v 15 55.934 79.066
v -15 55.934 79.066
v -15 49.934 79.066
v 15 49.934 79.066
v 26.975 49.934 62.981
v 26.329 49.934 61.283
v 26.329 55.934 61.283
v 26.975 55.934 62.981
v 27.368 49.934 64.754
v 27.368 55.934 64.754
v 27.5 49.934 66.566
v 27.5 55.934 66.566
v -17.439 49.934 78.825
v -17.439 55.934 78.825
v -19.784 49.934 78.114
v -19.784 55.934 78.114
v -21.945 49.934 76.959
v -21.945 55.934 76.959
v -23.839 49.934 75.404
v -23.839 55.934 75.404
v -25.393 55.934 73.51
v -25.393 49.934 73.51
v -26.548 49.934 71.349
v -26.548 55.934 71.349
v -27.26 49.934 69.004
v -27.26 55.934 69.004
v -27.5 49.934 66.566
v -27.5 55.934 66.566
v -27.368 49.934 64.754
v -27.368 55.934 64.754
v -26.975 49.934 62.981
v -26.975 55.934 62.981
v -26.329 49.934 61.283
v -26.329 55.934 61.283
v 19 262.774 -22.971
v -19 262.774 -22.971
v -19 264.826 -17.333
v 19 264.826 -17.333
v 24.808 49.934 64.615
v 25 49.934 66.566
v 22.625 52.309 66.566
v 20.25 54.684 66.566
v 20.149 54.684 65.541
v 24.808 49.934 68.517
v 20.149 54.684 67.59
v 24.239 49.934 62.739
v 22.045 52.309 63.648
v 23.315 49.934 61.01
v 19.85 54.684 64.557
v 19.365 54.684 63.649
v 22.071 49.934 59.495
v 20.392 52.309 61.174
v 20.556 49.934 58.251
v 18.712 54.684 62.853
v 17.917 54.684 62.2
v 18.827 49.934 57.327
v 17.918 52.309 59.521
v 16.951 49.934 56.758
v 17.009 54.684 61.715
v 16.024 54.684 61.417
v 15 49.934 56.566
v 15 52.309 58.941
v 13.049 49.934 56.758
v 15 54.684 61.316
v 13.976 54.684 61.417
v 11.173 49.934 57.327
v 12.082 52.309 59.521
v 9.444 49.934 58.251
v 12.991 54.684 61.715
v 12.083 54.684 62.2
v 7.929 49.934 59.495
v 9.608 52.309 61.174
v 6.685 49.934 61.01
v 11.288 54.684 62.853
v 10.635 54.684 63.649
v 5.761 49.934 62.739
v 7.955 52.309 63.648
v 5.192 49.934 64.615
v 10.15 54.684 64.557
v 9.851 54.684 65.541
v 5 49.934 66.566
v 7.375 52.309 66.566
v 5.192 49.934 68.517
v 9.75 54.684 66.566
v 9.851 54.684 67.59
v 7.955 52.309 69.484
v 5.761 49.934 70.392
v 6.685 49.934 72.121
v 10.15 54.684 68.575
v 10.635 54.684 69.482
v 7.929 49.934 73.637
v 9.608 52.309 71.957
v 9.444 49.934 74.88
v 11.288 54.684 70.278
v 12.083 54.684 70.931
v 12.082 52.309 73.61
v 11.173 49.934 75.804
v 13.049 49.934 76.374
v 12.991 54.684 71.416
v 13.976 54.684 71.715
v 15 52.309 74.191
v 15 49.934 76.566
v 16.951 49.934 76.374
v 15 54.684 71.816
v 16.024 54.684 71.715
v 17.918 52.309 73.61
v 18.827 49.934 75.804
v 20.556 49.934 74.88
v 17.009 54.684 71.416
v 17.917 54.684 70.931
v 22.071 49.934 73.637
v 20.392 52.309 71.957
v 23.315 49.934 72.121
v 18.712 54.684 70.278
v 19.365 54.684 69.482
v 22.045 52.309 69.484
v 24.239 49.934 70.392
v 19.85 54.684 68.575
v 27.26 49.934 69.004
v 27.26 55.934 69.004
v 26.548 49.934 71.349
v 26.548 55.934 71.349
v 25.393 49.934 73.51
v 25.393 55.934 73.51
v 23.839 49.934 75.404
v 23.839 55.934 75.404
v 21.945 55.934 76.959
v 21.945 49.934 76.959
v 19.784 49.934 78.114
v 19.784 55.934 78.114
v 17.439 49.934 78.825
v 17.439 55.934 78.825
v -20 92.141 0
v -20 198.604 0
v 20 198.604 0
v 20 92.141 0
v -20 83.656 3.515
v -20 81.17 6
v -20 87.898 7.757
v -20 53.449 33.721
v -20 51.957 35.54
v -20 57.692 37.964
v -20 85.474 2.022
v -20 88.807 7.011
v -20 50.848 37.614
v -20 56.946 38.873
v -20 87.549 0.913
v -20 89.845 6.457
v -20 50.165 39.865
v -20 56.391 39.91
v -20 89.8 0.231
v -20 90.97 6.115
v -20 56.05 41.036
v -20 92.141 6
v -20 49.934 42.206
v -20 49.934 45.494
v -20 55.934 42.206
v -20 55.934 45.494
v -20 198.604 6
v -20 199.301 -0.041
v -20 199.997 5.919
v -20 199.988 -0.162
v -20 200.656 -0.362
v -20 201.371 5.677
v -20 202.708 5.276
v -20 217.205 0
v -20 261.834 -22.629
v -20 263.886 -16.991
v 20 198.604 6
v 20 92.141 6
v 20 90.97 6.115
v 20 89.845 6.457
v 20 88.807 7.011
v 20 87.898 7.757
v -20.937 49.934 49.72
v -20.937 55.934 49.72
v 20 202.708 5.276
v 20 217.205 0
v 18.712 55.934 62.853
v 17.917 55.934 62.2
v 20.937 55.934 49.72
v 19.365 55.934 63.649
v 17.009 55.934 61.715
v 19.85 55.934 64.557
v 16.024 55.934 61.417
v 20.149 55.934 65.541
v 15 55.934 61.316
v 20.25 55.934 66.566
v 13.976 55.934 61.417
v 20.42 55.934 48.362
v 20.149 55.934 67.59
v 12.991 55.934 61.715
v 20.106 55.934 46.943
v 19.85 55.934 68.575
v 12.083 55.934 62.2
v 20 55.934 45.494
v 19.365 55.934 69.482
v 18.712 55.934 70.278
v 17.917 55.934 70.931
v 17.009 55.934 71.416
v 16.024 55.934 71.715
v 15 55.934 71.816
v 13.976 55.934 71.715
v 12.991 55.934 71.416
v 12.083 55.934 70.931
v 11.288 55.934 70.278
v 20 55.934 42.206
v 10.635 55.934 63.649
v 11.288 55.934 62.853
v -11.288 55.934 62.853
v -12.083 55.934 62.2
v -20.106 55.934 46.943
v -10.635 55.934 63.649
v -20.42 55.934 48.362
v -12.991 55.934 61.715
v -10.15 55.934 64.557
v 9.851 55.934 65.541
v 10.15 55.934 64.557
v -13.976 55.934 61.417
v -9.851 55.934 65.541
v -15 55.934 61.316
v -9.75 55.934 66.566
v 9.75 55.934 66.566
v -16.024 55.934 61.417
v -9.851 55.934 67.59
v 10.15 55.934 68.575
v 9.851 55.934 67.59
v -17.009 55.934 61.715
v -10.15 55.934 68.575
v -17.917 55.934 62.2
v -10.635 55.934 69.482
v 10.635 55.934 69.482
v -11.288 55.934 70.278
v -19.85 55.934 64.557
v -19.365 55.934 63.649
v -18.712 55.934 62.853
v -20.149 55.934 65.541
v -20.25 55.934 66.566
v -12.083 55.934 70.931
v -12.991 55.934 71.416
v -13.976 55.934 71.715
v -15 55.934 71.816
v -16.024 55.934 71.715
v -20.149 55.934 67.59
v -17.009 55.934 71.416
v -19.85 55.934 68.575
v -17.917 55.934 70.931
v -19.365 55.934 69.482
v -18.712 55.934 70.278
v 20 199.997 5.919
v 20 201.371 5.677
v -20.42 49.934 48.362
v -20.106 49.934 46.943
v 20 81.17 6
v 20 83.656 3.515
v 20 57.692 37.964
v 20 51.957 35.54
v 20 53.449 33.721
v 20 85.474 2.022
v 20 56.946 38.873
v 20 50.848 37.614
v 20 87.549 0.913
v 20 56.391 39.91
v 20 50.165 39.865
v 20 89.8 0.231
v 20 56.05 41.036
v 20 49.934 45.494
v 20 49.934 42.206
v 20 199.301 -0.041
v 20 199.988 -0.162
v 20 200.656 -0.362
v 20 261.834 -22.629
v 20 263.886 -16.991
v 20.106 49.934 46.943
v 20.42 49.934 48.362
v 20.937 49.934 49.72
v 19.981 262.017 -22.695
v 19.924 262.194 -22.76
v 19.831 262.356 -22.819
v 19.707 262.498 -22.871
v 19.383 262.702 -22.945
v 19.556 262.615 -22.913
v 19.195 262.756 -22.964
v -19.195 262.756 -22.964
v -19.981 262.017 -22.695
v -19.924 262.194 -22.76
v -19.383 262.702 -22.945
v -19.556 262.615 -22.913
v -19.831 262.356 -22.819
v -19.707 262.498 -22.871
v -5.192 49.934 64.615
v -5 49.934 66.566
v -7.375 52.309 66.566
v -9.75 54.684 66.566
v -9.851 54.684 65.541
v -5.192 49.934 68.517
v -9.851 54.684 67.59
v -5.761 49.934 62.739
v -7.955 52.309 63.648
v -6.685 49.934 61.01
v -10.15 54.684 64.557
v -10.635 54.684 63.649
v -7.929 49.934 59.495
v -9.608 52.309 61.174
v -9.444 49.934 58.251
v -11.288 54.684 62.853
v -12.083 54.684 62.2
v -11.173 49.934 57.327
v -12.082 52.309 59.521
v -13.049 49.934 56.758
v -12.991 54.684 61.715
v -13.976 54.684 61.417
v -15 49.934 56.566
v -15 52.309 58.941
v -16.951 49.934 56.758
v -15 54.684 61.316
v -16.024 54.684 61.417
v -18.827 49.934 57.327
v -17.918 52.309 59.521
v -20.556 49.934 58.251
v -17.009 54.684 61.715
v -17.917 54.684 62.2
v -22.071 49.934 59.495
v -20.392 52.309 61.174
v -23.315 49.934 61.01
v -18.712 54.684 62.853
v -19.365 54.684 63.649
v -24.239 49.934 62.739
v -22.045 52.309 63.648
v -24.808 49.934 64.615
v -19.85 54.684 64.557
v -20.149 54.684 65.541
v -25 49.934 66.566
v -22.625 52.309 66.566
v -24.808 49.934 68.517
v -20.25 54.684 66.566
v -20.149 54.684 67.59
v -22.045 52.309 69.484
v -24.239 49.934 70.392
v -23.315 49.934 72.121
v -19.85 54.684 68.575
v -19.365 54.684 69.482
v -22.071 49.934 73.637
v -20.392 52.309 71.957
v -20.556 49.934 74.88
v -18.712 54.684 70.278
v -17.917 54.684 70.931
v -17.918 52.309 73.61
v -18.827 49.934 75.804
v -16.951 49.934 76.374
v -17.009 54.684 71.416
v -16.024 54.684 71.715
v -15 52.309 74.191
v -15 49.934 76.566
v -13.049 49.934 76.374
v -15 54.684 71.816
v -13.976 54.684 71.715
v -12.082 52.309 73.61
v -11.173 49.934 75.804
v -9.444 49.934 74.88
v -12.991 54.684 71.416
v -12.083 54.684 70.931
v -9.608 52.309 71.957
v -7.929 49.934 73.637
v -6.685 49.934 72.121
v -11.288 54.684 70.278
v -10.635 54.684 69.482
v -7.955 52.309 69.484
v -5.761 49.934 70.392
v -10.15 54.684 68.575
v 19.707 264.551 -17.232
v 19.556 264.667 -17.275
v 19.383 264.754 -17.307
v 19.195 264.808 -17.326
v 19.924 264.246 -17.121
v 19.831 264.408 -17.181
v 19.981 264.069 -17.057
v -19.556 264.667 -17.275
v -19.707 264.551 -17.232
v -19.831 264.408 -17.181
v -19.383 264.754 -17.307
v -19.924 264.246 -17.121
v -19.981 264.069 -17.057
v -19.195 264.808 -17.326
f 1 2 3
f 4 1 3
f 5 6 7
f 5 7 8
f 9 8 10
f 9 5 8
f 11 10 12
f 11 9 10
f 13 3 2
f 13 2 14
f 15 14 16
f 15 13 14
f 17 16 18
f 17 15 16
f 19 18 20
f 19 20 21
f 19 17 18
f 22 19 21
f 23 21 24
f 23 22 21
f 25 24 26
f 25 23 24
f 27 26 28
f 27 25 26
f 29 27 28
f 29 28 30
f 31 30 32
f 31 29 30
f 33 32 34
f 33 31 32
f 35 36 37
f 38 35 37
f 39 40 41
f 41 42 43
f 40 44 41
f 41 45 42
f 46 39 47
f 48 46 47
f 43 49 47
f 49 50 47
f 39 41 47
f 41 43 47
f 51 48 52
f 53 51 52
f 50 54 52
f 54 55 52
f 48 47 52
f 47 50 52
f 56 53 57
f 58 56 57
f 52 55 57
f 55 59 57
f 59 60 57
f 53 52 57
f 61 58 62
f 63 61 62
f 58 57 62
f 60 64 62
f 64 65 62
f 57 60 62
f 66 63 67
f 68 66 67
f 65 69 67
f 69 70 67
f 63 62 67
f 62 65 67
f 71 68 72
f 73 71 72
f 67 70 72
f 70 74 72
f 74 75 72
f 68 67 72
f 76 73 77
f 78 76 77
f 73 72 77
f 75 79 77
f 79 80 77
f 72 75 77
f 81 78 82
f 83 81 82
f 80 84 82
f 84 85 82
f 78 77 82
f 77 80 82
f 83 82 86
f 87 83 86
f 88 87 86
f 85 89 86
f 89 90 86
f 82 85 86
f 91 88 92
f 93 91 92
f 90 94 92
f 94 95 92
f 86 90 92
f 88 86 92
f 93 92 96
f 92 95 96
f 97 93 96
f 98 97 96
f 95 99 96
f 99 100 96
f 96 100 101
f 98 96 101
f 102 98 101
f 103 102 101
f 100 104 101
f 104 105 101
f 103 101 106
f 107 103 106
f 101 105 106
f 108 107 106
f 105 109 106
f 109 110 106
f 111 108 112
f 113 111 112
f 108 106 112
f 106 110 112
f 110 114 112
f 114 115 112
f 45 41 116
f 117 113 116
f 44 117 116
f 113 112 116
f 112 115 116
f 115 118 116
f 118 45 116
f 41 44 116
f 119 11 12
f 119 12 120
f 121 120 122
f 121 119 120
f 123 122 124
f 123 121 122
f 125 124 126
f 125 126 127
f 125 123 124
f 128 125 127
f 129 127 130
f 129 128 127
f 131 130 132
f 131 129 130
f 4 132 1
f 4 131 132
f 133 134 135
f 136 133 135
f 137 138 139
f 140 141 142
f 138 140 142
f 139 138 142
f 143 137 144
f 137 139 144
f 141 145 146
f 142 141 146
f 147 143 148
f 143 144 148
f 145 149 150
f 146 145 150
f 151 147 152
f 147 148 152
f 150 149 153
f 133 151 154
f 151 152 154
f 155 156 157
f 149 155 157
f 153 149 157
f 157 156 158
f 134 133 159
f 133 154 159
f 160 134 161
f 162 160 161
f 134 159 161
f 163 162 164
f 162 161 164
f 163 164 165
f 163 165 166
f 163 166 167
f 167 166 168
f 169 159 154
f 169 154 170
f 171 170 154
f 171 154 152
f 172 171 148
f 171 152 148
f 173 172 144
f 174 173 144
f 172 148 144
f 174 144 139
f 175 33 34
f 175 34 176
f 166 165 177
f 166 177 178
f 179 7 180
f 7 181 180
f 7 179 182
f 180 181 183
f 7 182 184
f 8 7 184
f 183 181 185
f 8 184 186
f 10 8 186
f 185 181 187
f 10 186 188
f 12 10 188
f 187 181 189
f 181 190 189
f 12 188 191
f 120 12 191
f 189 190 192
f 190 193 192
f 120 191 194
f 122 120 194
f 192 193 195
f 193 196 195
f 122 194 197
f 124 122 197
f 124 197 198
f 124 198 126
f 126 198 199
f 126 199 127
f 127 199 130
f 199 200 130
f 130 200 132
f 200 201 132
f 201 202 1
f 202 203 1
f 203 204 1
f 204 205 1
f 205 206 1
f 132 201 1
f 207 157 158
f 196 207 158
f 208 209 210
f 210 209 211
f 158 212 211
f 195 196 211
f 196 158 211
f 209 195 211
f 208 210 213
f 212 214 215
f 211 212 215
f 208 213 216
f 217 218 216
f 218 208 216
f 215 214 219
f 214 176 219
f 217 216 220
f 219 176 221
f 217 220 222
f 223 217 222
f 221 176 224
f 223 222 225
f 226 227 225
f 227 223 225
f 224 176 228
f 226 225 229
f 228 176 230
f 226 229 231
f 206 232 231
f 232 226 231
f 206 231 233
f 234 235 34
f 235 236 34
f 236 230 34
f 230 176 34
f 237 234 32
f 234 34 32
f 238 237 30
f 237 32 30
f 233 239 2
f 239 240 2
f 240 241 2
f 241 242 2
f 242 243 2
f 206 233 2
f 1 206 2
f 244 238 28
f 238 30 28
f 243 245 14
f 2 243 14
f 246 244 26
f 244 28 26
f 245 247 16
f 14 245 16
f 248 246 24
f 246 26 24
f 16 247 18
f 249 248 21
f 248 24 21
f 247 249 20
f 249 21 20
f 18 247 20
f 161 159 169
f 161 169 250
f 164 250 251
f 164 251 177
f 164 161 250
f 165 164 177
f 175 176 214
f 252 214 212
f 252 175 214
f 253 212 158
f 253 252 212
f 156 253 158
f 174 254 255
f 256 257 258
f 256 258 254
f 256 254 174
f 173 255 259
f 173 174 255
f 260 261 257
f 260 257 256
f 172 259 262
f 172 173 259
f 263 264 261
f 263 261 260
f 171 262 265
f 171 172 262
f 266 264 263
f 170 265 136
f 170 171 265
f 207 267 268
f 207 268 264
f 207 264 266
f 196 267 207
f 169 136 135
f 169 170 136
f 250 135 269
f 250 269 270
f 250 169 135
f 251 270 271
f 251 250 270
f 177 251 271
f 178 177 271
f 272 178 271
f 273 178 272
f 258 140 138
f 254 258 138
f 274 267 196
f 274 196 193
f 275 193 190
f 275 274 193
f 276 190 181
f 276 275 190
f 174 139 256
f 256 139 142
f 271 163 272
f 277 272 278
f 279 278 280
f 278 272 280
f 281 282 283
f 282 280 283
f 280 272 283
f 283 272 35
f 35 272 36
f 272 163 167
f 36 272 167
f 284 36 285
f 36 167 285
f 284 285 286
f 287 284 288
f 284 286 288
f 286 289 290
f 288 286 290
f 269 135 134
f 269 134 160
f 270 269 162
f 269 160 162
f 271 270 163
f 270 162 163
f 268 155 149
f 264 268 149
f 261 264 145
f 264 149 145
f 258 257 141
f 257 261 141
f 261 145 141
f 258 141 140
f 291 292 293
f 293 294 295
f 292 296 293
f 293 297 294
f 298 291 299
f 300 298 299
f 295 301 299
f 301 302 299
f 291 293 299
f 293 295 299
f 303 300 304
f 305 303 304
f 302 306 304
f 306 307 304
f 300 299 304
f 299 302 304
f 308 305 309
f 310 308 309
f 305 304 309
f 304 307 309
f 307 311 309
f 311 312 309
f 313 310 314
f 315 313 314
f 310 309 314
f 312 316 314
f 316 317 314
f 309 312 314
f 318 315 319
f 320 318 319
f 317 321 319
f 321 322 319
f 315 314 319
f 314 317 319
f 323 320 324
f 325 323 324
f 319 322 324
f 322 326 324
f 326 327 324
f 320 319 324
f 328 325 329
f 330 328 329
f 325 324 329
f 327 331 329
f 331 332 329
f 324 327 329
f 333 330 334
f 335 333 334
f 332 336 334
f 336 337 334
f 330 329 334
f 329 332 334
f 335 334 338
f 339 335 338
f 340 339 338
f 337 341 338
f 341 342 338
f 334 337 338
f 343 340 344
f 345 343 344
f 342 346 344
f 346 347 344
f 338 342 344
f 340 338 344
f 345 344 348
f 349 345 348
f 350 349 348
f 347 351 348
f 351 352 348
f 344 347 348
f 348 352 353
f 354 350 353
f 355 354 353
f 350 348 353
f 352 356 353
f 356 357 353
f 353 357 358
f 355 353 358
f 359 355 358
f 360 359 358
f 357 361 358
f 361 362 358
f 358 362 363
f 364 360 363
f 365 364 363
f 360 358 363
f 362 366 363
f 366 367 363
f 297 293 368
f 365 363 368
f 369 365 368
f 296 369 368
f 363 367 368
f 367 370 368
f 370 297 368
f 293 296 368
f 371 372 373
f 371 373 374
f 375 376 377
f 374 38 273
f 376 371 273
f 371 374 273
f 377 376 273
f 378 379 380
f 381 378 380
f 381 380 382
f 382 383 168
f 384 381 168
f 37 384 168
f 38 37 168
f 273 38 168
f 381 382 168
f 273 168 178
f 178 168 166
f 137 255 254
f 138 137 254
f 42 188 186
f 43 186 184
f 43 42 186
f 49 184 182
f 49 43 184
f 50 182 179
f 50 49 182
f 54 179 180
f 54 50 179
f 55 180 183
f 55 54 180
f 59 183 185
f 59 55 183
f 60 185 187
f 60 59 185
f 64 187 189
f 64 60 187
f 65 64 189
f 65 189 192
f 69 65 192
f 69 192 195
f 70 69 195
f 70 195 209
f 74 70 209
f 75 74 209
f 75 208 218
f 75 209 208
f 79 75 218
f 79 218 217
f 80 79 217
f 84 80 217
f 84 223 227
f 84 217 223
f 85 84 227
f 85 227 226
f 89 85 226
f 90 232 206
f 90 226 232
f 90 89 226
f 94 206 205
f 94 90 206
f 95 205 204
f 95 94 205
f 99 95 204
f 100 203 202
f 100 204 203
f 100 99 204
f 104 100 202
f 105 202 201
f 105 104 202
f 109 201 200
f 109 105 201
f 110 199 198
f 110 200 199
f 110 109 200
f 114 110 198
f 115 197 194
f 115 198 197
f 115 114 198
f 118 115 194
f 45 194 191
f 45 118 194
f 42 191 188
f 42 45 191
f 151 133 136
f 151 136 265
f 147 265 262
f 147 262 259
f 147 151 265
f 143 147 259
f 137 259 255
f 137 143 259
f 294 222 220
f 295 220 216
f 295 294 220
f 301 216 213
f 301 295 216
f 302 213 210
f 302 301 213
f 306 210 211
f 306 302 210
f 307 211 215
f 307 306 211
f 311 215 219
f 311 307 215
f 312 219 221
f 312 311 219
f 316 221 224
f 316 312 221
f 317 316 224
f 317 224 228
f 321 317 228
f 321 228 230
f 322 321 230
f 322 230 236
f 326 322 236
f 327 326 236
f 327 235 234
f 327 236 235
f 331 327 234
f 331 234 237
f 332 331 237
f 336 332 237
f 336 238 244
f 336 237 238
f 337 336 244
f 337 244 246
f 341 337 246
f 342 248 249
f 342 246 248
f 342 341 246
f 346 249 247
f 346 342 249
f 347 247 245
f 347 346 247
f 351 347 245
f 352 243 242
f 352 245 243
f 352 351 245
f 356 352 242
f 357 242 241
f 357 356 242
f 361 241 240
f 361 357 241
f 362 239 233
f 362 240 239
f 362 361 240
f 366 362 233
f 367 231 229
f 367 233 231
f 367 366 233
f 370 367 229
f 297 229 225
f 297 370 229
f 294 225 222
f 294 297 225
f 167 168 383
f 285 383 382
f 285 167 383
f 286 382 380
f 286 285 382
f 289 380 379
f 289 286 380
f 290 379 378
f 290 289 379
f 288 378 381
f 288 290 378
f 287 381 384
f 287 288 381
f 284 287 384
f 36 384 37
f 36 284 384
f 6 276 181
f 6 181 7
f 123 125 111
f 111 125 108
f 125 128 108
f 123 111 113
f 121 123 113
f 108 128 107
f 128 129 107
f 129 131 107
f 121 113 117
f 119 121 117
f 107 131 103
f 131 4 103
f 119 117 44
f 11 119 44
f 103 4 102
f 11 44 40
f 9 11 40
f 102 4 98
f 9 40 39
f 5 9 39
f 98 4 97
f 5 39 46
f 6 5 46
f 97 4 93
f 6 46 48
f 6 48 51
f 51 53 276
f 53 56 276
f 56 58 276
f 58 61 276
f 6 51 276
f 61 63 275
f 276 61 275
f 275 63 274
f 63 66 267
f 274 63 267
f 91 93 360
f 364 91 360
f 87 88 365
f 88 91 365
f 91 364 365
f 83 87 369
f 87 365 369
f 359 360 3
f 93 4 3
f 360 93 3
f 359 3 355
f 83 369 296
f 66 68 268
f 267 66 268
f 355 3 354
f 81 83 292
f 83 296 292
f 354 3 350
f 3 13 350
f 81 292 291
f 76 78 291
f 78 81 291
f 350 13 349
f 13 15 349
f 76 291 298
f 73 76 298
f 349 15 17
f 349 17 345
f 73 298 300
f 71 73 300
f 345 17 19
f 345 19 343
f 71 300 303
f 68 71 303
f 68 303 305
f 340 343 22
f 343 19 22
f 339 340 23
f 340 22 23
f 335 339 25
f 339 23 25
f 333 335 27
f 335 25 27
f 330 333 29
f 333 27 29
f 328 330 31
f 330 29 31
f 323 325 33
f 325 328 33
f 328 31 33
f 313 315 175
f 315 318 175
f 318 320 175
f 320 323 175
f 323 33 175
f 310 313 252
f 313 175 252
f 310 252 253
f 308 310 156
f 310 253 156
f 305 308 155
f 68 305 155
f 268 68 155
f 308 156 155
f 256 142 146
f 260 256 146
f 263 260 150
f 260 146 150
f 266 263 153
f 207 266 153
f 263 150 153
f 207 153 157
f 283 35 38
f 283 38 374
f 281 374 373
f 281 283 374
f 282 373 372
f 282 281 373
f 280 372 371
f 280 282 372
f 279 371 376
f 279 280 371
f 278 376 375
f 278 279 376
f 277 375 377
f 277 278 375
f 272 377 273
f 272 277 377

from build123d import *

# Parameters (mm, degrees)
SKETCH1_R                  = 5.25
EXTRUDE1_DEPTH             = 6
PROCESS_BENDS1_START       = -28
PROCESS_BENDS1_DEPTH       = 56
PROCESS_BENDS1_START_2     = -20
PROCESS_BENDS1_2_DEPTH     = 40
PROCESS_BENDS1_START_3     = -27.5
PROCESS_BENDS1_3_DEPTH     = 55
PROCESS_BENDS1_START_4     = 67
PROCESS_BENDS1_4_DEPTH     = 8
PROCESS_BENDS1_START_5     = 49.934347195
PROCESS_BENDS1_5_OUTLINE_R = 5.25
PROCESS_BENDS1_5_DEPTH     = 43.065652805
CHAMFER1_SIZE              = 4.75


with BuildPart() as part:
    # Sketch1 → Extrude1 (new body)
    with BuildSketch(Plane.XY):
        with BuildLine():
            Line((-15, 0), (15, 0))
            ThreePointArc((15, 0), (25.542393073, 5.783754896), (26.328847338, 17.782728272))
            Line((26.328847338, 17.782728272), (20.93692213, 29.345749196))
            ThreePointArc((20.93692213, 29.345749196), (20.237039929, 31.407535674), (20, 33.571931813))
            Line((20, 33.571931813), (20, 266.5))
            ThreePointArc((20, 266.5), (19.707106781, 267.207106781), (19, 267.5))
            Line((19, 267.5), (-19, 267.5))
            ThreePointArc((-19, 267.5), (-19.707106781, 267.207106781), (-20, 266.5))
            Line((-20, 266.5), (-20, 33.571931813))
            ThreePointArc((-20, 33.571931813), (-20.237039929, 31.407535674), (-20.93692213, 29.345749196))
            Line((-20.93692213, 29.345749196), (-26.328847338, 17.782728272))
            ThreePointArc((-26.328847338, 17.782728272), (-25.542393073, 5.783754896), (-15, 0))
        make_face()
        with Locations((15, 12.5)):
            Circle(SKETCH1_R, mode=Mode.SUBTRACT)
        with Locations(Location((-15, 12.5, 0), (0, 0, 180))):
            Circle(SKETCH1_R, mode=Mode.SUBTRACT)
    extrude(amount=EXTRUDE1_DEPTH)

    # Process-Bends1: read off the stored shape, not the designer's step
    # Process-Bends1 outline → Process-Bends1 (cut)
    with BuildSketch(Plane.YZ.offset(PROCESS_BENDS1_START)):
        with BuildLine():
            Line((202.708327384, 5.276311449), (217.204873948, 0))
            Line((217.204873948, 0), (267.5, 0))
            Line((267.5, 0), (267.5, 6))
            Line((267.5, 6), (198.604085664, 6))
            ThreePointArc((198.604085664, 6), (200.687863796, 5.817693036), (202.708327384, 5.276311449))
        make_face()
        with BuildLine():
            Line((0, 0), (92.140807255, 0))
            ThreePointArc((92.140807255, 0), (87.548606067, 0.91344561), (83.655525881, 3.514718626))
            Line((83.655525881, 3.514718626), (81.170244507, 6))
            Line((81.170244507, 6), (0, 6))
            Line((0, 6), (0, 0))
        make_face()
    extrude(amount=PROCESS_BENDS1_DEPTH, mode=Mode.SUBTRACT)

    # Process-Bends1 2 outline → Process-Bends1 2 (add)
    with BuildSketch(Plane.YZ.offset(PROCESS_BENDS1_START_2)):
        with BuildLine():
            Line((262.773728027, -22.970773129), (264.825848887, -17.332617404))
            Line((264.825848887, -17.332617404), (217.204873948, 0))
            Line((217.204873948, 0), (198.604085664, 0))
            ThreePointArc((198.604085664, 0), (199.64597473, -0.091153482), (200.656206524, -0.361844275))
            Line((200.656206524, -0.361844275), (262.773728027, -22.970773129))
        make_face()
        with BuildLine():
            Line((81.170244507, 6), (92.140807255, 6))
            ThreePointArc((92.140807255, 6), (89.844706661, 6.456722805), (87.898166568, 7.757359313))
            Line((87.898166568, 7.757359313), (57.691706508, 37.963819374))
            ThreePointArc((57.691706508, 37.963819374), (56.39107, 39.910359467), (55.934347195, 42.206460061))
            Line((55.934347195, 42.206460061), (55.934347195, 79.065652805))
            Line((55.934347195, 79.065652805), (49.934347195, 79.065652805))
            Line((49.934347195, 79.065652805), (49.934347195, 42.206460061))
            ThreePointArc((49.934347195, 42.206460061), (50.847792805, 37.614258872), (53.44906582, 33.721178686))
            Line((53.44906582, 33.721178686), (81.170244507, 6))
        make_face()
    extrude(amount=PROCESS_BENDS1_2_DEPTH)

    # Process-Bends1 3 outline → Process-Bends1 3 (add)
    with BuildSketch(Plane.YZ.offset(PROCESS_BENDS1_START_3)):
        with BuildLine():
            Line((81.170244507, 6), (92.140807255, 6))
            ThreePointArc((92.140807255, 6), (89.844706661, 6.456722805), (87.898166568, 7.757359313))
            Line((87.898166568, 7.757359313), (57.691706508, 37.963819374))
            ThreePointArc((57.691706508, 37.963819374), (56.39107, 39.910359467), (55.934347195, 42.206460061))
            Line((55.934347195, 42.206460061), (55.934347195, 79.065652805))
            Line((55.934347195, 79.065652805), (49.934347195, 79.065652805))
            Line((49.934347195, 79.065652805), (49.934347195, 42.206460061))
            ThreePointArc((49.934347195, 42.206460061), (50.847792805, 37.614258872), (53.44906582, 33.721178686))
            Line((53.44906582, 33.721178686), (81.170244507, 6))
        make_face()
    extrude(amount=PROCESS_BENDS1_3_DEPTH)

    # Process-Bends1 4 outline → Process-Bends1 4 (cut)
    with BuildSketch(Plane(origin=(0, 0, 0), x_dir=(1, 0, 0), z_dir=(0, 0.3420201433256691, 0.9396926207859083)).offset(PROCESS_BENDS1_START_4)):
        with BuildLine():
            Line((20, 254.783000281), (19, 254.783000281))
            ThreePointArc((19, 254.783000281), (19.707106781, 254.490107062), (20, 253.783000281))
            Line((20, 253.783000281), (20, 254.783000281))
        make_face()
        with BuildLine():
            ThreePointArc((-20, 253.783000281), (-19.707106781, 254.490107062), (-19, 254.783000281))
            Line((-19, 254.783000281), (-20, 254.783000281))
            Line((-20, 254.783000281), (-20, 253.783000281))
        make_face()
    extrude(amount=PROCESS_BENDS1_4_DEPTH, mode=Mode.SUBTRACT)

    # Process-Bends1 5 outline → Process-Bends1 5 (cut)
    with BuildSketch(Plane(origin=(0, 0, 0), x_dir=(1, 0, 0), z_dir=(0, 1, 0)).offset(PROCESS_BENDS1_START_5)):
        with BuildLine():
            ThreePointArc((-20.93692213, -49.719903609), (-20.237039929, -47.658117131), (-20, -45.493720992))
            Line((-20, -45.493720992), (-20, -6))
            Line((-20, -6), (-27.5, -6))
            Line((-27.5, -6), (-27.5, -66.565652806))
            ThreePointArc((-27.5, -66.565652806), (-27.203700089, -63.860157632), (-26.328847338, -61.282924534))
            Line((-26.328847338, -61.282924534), (-20.93692213, -49.719903609))
        make_face()
        with BuildLine():
            ThreePointArc((26.328847338, -61.282924534), (27.203700089, -63.860157632), (27.5, -66.565652806))
            Line((27.5, -66.565652806), (27.5, -6))
            Line((27.5, -6), (20, -6))
            Line((20, -6), (20, -45.493720992))
            ThreePointArc((20, -45.493720992), (20.237039929, -47.658117131), (20.93692213, -49.719903609))
            Line((20.93692213, -49.719903609), (26.328847338, -61.282924534))
        make_face()
        with BuildLine():
            ThreePointArc((27.5, -66.565652806), (23.838834765, -75.404487571), (15, -79.065652805))
            Line((15, -79.065652805), (27.5, -79.065652805))
            Line((27.5, -79.065652805), (27.5, -66.565652806))
        make_face()
        with BuildLine():
            ThreePointArc((-15, -79.065652805), (-23.838834765, -75.404487571), (-27.5, -66.565652806))
            Line((-27.5, -66.565652806), (-27.5, -79.065652805))
            Line((-27.5, -79.065652805), (-15, -79.065652805))
        make_face()
        with Locations((-15, -66.565652805)):
            Circle(PROCESS_BENDS1_5_OUTLINE_R)
        with Locations((15, -66.565652805)):
            Circle(PROCESS_BENDS1_5_OUTLINE_R)
    extrude(amount=PROCESS_BENDS1_5_DEPTH, mode=Mode.SUBTRACT)

    # Chamfer1
    chamfer1_edges = [part.edges().sort_by_distance(p)[0] for p in [
        (9.75, 49.934347195, 66.565652805),
        (-20.25, 49.934347195, 66.565652805),
    ]]
    chamfer(chamfer1_edges, length=CHAMFER1_SIZE)


solid = part.part
